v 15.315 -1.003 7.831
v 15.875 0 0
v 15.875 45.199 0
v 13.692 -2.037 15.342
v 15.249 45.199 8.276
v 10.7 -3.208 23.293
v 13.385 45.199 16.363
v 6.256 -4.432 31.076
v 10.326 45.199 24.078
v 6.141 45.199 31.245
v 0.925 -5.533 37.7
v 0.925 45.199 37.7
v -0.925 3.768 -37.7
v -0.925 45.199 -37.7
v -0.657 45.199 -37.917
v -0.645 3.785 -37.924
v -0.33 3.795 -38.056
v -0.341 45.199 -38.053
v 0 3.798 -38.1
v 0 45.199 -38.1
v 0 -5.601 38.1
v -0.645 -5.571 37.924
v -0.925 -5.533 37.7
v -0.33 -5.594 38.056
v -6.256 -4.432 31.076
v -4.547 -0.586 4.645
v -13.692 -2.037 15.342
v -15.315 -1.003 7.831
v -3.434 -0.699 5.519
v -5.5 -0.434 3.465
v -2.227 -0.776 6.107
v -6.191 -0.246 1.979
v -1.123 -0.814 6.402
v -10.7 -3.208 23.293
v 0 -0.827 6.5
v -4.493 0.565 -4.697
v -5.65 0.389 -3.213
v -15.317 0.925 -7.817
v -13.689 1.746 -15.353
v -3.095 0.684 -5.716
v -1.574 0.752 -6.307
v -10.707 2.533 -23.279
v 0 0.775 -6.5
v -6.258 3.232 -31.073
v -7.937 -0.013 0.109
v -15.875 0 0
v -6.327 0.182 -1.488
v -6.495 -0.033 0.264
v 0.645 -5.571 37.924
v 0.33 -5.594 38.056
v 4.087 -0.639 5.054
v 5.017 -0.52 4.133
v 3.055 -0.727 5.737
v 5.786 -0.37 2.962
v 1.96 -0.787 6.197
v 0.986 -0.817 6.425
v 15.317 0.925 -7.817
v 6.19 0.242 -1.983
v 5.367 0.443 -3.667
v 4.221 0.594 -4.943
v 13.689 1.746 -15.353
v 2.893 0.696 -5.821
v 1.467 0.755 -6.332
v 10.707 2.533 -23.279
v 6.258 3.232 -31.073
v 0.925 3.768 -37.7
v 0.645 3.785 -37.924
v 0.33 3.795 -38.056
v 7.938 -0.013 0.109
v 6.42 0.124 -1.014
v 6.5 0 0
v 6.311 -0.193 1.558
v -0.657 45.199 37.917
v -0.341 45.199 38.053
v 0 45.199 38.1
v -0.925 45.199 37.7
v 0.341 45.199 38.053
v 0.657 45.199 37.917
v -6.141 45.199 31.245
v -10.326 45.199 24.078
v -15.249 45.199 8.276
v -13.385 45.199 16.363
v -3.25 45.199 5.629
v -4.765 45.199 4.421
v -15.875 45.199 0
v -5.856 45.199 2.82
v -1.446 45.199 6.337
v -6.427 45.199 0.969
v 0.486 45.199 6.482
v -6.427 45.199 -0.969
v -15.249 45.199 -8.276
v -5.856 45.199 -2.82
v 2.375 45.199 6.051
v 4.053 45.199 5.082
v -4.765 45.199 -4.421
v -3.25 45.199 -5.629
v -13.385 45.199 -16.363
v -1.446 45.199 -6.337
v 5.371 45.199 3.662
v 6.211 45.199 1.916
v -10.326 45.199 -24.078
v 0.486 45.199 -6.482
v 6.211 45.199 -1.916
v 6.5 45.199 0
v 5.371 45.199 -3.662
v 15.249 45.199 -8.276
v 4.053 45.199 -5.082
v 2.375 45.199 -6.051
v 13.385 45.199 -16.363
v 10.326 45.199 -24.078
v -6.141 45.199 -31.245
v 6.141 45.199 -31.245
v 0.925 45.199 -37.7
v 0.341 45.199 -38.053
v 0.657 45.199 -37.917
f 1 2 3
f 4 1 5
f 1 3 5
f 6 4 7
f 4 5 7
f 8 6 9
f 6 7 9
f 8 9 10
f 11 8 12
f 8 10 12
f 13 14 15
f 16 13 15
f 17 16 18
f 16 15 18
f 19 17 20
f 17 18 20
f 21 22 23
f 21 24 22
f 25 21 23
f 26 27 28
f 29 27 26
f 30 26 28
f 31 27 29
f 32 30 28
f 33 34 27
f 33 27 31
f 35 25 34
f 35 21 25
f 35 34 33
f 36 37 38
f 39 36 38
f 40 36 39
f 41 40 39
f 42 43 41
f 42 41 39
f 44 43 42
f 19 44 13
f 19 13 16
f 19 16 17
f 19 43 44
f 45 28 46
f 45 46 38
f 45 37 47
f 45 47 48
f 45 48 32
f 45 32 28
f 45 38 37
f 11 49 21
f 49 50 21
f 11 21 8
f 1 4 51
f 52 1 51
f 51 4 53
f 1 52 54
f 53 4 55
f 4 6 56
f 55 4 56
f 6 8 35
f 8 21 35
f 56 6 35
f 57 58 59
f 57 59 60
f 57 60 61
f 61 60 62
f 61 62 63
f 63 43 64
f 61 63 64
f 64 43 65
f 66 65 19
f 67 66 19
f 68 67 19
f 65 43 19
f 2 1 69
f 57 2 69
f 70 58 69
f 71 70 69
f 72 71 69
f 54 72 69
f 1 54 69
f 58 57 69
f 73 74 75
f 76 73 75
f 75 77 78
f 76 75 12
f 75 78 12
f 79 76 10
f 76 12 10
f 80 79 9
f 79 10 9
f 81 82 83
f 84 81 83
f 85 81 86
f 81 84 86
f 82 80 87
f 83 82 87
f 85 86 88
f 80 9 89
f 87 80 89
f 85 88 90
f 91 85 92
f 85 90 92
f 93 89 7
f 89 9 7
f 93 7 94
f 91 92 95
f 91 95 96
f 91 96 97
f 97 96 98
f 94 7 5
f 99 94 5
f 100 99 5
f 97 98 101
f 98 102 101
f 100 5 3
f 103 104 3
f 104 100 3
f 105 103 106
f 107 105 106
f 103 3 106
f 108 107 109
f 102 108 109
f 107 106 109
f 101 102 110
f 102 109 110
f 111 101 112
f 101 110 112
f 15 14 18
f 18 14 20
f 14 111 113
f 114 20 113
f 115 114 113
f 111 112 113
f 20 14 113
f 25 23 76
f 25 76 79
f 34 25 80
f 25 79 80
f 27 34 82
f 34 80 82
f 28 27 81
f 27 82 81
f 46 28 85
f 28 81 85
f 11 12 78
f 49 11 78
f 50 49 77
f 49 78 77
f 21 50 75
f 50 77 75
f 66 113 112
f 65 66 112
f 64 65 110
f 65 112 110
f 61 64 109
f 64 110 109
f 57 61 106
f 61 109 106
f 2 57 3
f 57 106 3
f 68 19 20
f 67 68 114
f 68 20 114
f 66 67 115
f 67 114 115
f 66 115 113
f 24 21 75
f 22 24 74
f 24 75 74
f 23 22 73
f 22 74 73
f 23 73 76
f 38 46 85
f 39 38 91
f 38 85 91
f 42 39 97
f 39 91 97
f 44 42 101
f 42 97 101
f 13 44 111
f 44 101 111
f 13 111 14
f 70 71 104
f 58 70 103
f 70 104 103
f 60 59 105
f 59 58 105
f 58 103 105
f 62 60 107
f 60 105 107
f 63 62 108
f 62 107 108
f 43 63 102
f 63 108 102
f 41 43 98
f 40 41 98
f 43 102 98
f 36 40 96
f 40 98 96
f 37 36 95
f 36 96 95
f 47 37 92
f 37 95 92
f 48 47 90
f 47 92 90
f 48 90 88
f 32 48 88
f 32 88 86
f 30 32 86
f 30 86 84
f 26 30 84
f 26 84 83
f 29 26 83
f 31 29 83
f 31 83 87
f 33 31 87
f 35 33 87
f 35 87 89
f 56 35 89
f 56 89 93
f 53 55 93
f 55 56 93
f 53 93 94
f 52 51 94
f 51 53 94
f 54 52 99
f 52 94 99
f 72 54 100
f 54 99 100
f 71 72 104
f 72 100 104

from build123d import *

# Parameters (mm, degrees)
BOSS_EXTRUDE1_DEPTH = 15.875
SKETCH3_R           = 6.5
CUT_EXTRUDE1_DEPTH  = 51.8000001


with BuildPart() as part:
    # Sketch2 → Boss-Extrude1 (new body, symmetric)
    with BuildSketch(Plane(origin=(0, 0, 0), x_dir=(0, 0, -1), z_dir=(1, 0, 0))):
        with BuildLine():
            Line((-38.1, -5.601130621), (-38.1, 45.198869379))
            Line((-38.1, 45.198869379), (38.1, 45.198869379))
            Line((38.1, 45.198869379), (38.1, 3.798196304))
            add(Edge.make_bspline(
                [(-38.1, -5.601130621), (-0.21894309, 0.874475249), (38.1, 3.798196304)],
                knots=[0, 0, 0, 1, 1, 1], degree=2))
        make_face()
    extrude(amount=BOSS_EXTRUDE1_DEPTH, both=True)

    # Sketch3 → Cut-Extrude1 (cut, through all)
    with BuildSketch(Plane(origin=(0, 45.198869379, 0), x_dir=(1, 0, 0), z_dir=(0, 1, 0))):
        with BuildLine():
            Line((0, -38.1), (15.875, -38.1))
            Line((15.875, -38.1), (15.875, -2.65e-07))
            ThreePointArc((15.875, -2.65e-07), (12.001057449, -20.2782212), (0.924852299, -37.700372463))
            ThreePointArc((0.924852299, -37.700372463), (0.503749428, -37.995820104), (0, -38.1))
        make_face()
        with BuildLine():
            ThreePointArc((0.924852299, 37.700372463), (12.001057547, 20.278220954), (15.875, -2.65e-07))
            Line((15.875, -2.65e-07), (15.875, 38.1))
            Line((15.875, 38.1), (0, 38.1))
            ThreePointArc((0, 38.1), (0.503749428, 37.995820104), (0.924852299, 37.700372463))
        make_face()
        with BuildLine():
            Line((-15.875, -38.1), (0, -38.1))
            ThreePointArc((0, -38.1), (-0.503749428, -37.995820104), (-0.924852299, -37.700372463))
            ThreePointArc((-0.924852299, -37.700372463), (-12.001057487, -20.278221106), (-15.875, -6.3e-08))
            Line((-15.875, -6.3e-08), (-15.875, -38.1))
        make_face()
        with BuildLine():
            ThreePointArc((-0.924852299, 37.700372463), (-0.503749428, 37.995820104), (0, 38.1))
            Line((0, 38.1), (-15.875, 38.1))
            Line((-15.875, 38.1), (-15.875, -6.3e-08))
            ThreePointArc((-15.875, -6.3e-08), (-12.00105751, 20.278221048), (-0.924852299, 37.700372463))
        make_face()
        Circle(SKETCH3_R)
    extrude(amount=-CUT_EXTRUDE1_DEPTH, mode=Mode.SUBTRACT)


solid = part.part
